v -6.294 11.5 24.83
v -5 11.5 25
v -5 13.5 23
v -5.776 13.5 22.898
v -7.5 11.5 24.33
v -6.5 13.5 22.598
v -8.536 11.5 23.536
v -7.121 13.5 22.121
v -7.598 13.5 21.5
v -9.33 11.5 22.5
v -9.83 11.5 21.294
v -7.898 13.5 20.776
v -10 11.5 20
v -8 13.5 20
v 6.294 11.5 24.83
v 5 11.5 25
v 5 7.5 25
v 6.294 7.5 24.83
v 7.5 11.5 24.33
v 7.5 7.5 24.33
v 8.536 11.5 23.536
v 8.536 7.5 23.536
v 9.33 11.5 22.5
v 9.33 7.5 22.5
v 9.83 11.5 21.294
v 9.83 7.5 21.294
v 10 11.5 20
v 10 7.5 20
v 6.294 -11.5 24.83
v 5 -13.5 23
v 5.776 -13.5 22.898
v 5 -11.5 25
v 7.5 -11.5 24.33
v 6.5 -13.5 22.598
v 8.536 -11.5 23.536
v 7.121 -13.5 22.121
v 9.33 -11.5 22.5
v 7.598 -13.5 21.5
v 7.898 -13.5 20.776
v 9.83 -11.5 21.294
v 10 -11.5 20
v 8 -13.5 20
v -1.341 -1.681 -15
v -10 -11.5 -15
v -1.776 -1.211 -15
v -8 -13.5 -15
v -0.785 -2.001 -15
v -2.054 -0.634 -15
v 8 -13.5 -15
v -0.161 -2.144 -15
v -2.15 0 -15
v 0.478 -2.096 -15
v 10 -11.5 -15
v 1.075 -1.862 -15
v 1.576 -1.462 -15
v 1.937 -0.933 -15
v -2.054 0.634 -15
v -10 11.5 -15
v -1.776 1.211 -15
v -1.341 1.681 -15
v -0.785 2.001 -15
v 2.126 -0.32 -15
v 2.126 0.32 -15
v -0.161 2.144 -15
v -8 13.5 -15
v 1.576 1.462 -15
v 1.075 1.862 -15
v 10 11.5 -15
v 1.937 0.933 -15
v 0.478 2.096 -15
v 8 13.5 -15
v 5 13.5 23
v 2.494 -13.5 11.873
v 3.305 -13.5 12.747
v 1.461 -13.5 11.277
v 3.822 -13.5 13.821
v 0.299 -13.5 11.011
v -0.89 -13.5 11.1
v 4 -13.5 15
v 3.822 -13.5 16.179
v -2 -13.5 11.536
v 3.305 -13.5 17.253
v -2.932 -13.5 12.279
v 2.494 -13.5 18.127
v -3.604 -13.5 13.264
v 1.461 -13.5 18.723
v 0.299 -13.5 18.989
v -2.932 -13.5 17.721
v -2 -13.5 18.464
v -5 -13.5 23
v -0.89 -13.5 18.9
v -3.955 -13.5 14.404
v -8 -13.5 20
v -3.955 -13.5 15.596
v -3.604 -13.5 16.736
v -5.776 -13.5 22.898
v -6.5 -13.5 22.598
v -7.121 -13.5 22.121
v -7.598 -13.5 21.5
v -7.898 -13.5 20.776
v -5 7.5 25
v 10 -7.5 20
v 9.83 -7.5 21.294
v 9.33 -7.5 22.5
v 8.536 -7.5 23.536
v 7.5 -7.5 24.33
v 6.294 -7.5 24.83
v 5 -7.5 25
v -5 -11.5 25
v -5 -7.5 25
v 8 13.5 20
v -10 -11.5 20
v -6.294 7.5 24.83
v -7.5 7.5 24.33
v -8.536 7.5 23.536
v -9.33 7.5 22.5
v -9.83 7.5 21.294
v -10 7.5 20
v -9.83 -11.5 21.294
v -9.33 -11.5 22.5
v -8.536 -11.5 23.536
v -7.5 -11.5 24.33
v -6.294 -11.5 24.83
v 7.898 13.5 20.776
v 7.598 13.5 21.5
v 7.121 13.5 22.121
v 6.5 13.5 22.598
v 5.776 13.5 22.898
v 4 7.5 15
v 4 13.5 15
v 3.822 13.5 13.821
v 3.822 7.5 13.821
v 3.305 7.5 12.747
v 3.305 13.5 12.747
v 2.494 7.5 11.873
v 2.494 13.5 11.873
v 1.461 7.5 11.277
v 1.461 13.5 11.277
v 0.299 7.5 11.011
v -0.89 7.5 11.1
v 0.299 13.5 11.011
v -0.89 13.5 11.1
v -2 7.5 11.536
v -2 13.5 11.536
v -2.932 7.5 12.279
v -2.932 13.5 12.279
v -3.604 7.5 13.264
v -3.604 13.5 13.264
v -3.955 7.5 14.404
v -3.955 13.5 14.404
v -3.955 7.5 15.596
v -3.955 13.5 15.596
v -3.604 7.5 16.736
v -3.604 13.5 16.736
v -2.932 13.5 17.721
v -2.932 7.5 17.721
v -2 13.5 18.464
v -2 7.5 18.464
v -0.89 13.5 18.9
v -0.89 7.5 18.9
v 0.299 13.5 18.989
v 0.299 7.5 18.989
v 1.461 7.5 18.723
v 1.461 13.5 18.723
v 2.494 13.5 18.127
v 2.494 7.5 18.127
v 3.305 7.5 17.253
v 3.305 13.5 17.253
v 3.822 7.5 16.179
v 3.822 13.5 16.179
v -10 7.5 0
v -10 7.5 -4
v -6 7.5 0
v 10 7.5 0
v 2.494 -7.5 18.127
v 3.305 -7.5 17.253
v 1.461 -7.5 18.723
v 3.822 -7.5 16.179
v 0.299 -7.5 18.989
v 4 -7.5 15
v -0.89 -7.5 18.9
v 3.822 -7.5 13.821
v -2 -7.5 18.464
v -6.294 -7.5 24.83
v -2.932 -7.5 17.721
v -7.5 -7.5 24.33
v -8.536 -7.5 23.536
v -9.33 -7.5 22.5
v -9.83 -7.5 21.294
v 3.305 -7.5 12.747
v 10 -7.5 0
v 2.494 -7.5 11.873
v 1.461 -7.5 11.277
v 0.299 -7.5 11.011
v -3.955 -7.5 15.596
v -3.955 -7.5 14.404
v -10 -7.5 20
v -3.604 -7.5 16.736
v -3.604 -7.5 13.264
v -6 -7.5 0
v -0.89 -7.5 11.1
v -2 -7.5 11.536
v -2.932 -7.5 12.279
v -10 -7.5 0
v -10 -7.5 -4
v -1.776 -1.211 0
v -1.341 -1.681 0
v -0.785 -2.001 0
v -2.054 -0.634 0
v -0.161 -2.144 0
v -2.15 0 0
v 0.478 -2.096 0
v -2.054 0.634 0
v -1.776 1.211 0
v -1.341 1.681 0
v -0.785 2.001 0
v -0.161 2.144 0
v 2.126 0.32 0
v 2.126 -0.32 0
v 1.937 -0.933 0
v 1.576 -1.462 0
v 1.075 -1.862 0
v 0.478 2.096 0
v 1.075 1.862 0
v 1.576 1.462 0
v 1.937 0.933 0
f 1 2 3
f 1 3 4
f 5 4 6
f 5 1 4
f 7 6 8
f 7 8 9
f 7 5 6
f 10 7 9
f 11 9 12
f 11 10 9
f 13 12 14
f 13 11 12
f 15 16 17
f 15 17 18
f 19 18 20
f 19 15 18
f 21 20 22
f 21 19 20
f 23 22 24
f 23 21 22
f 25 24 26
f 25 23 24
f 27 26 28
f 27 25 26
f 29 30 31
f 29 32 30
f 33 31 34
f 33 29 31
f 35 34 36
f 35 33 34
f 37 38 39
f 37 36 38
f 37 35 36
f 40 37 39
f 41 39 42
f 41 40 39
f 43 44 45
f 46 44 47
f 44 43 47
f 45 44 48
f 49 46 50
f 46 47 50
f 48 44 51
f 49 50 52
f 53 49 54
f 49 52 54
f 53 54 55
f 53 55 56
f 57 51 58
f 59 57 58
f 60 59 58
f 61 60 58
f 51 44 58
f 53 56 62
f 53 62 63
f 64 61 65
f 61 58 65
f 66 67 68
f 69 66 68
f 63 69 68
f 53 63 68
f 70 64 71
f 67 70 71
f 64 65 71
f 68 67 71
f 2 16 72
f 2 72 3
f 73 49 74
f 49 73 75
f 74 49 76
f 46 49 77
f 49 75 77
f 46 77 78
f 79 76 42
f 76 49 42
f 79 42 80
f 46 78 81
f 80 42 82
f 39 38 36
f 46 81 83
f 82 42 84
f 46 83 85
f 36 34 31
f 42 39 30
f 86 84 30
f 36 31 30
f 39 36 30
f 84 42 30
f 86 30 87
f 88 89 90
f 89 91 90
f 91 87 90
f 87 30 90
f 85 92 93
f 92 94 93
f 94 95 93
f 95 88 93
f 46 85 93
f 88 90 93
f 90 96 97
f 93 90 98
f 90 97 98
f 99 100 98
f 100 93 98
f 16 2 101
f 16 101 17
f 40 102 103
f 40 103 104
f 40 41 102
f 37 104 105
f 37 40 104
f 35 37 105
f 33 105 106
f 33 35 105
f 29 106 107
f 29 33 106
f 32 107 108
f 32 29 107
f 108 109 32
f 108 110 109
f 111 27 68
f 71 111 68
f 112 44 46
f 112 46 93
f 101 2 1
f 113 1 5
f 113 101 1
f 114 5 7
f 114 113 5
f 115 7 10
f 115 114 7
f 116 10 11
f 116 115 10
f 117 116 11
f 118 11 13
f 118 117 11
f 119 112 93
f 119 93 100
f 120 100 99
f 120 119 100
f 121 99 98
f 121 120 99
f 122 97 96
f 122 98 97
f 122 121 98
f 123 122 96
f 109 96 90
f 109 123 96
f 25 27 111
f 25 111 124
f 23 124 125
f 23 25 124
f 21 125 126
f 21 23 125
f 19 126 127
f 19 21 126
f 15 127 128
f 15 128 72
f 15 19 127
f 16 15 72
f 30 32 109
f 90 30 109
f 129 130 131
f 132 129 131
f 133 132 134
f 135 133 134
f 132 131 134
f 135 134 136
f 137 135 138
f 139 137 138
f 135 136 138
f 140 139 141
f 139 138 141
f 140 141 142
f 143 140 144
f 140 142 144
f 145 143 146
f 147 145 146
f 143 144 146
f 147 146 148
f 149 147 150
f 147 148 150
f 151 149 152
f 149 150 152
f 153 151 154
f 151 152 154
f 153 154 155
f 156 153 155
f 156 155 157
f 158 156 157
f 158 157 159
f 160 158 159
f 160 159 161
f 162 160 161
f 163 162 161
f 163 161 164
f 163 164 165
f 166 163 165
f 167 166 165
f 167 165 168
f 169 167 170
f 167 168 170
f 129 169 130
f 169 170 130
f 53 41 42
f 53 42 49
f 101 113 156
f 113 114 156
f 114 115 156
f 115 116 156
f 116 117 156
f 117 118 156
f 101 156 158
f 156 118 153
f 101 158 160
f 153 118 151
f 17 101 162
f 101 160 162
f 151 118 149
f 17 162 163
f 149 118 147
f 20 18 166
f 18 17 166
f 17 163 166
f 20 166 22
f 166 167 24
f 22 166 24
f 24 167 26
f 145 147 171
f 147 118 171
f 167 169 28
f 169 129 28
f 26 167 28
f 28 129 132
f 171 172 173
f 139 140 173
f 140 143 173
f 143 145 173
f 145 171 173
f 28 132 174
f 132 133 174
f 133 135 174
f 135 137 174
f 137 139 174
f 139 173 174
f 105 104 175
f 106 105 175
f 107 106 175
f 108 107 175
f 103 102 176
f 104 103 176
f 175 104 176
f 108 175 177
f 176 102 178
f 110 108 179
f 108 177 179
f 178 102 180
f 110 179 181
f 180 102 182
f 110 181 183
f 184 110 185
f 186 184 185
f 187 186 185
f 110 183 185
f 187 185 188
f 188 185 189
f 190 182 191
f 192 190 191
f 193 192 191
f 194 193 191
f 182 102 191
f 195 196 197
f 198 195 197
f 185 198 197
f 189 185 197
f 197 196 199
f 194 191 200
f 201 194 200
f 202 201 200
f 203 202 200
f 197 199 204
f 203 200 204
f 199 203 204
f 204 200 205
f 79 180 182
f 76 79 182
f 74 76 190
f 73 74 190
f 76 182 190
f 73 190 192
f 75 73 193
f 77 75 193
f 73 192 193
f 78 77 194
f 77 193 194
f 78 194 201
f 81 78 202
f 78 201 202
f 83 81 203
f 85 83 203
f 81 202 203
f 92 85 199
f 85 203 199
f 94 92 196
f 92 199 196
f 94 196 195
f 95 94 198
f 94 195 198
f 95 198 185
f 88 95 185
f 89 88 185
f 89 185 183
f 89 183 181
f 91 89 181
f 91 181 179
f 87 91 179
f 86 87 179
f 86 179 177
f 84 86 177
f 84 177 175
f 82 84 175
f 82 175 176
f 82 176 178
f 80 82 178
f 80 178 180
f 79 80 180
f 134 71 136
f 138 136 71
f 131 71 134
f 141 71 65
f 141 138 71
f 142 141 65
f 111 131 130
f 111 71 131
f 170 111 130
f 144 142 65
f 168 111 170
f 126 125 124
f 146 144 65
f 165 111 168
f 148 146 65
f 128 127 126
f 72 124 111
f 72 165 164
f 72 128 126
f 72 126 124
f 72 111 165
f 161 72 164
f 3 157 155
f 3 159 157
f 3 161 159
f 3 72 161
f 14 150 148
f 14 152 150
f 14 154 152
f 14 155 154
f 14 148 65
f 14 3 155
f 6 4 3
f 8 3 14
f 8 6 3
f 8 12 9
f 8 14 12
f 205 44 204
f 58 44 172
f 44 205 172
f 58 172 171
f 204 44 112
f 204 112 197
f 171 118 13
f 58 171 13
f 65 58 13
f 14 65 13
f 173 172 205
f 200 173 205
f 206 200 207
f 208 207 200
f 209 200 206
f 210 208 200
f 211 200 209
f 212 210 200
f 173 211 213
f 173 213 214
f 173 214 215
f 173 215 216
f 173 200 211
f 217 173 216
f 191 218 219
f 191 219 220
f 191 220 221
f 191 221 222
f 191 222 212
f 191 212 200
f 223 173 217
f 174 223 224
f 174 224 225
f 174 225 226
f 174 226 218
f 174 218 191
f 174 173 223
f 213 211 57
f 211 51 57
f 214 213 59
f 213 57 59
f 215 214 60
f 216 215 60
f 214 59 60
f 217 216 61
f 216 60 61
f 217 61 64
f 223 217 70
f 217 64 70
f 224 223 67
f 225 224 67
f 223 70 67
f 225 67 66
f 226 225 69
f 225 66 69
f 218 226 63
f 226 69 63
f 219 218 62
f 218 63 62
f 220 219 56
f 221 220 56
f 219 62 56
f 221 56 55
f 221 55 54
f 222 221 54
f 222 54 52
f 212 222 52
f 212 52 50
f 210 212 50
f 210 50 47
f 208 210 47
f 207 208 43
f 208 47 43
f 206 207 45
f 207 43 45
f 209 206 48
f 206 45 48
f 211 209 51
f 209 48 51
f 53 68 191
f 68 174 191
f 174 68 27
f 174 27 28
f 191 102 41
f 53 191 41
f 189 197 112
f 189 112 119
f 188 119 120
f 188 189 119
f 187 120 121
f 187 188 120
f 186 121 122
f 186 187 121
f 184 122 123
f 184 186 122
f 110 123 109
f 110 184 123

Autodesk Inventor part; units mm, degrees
ref_plane "YZ Plane" through (0, 0, 0) normal (1, 0, 0) x (0, 1, 0)
ref_plane "XZ Plane" through (0, 0, 0) normal (0, 1, 0) x (-1, 0, 0)
ref_plane "XY Plane" through (0, 0, 0) normal (0, 0, 1) x (1, 0, 0)
sketch "Sketch1" plane through (0, 0, 0) normal (0, 0, 1) x (1, 0, 0)
  line L0 (10, -7.5) -> (-10, -7.5)
  line L1 (-10, -7.5) -> (-10, 7.5)
  line L2 (-10, 7.5) -> (10, 7.5)
  line L3 (10, 7.5) -> (10, -7.5)
  line L4 (10, -7.5) -> (-10, 7.5) construction
  line L5 (-10, -7.5) -> (10, 7.5) construction
  line L6 (-10, 7.5) -> (10, 7.5)
  line L7 (10, 7.5) -> (10, 13.5)
  line L8 (10, 13.5) -> (-10, 13.5)
  line L9 (-10, 13.5) -> (-10, 7.5)
  line L10 (-10, -7.5) -> (10, -7.5)
  line L11 (10, -7.5) -> (10, -13.5)
  line L12 (10, -13.5) -> (-10, -13.5)
  line L13 (-10, -13.5) -> (-10, -7.5)
  point P0 (0, 0)
  dimension "d0" = 15
  dimension "d1" = 20
  dimension "d2" = 6
extrude "Extrusion1" add sketch "Sketch1" against normal blind 15
extrude "Extrusion2" add sketch "Sketch1" along normal blind 25 contours L11 L12 L13 L0 | L2 L9 L8 L7
sketch "Sketch2" plane through (-10, 13.5, -15) normal (0, 1, 0) x (1, 0, 0)
  line L0 (20, -15) -> (0, -15) projected
  line L1 (20, -40) -> (0, -40) construction
  line L2 (10, -40) -> (10, -30) construction
  circle A0 centre (10, -30) radius 4
  point P0 (10, -15)
  dimension "d7" = 8
  dimension "d8" = 10
extrude "Extrusion3" cut sketch "Sketch2" against normal through all
fillet "Fillet1" radius 5 4 edges at (-10, 10.5, 25) (10, 10.5, 25) (-10, -10.5, 25) (10, -10.5, 25)
sketch "Sketch3" plane through (0, 0, -15) normal (0, 0, -1) x (-1, 0, 0)
  circle A0 centre (0, 0) radius 2.15
  dimension "d12" = 4.3
extrude "Extrusion4" cut sketch "Sketch3" against normal through all
chamfer "Chamfer1" distance 2 angle 45 6 edges at (8.5355, 13.5, 23.5355) (0, 13.5, 25) (-8.5355, 13.5, 23.5355) (8.5355, -13.5, 23.5355) (0, -13.5, 25) (-8.5355, -13.5, 23.5355)
chamfer "Chamfer2" distance 4 angle 45 1 edges at (-10, 0, 0)
properties part number "cylinder clevis"
